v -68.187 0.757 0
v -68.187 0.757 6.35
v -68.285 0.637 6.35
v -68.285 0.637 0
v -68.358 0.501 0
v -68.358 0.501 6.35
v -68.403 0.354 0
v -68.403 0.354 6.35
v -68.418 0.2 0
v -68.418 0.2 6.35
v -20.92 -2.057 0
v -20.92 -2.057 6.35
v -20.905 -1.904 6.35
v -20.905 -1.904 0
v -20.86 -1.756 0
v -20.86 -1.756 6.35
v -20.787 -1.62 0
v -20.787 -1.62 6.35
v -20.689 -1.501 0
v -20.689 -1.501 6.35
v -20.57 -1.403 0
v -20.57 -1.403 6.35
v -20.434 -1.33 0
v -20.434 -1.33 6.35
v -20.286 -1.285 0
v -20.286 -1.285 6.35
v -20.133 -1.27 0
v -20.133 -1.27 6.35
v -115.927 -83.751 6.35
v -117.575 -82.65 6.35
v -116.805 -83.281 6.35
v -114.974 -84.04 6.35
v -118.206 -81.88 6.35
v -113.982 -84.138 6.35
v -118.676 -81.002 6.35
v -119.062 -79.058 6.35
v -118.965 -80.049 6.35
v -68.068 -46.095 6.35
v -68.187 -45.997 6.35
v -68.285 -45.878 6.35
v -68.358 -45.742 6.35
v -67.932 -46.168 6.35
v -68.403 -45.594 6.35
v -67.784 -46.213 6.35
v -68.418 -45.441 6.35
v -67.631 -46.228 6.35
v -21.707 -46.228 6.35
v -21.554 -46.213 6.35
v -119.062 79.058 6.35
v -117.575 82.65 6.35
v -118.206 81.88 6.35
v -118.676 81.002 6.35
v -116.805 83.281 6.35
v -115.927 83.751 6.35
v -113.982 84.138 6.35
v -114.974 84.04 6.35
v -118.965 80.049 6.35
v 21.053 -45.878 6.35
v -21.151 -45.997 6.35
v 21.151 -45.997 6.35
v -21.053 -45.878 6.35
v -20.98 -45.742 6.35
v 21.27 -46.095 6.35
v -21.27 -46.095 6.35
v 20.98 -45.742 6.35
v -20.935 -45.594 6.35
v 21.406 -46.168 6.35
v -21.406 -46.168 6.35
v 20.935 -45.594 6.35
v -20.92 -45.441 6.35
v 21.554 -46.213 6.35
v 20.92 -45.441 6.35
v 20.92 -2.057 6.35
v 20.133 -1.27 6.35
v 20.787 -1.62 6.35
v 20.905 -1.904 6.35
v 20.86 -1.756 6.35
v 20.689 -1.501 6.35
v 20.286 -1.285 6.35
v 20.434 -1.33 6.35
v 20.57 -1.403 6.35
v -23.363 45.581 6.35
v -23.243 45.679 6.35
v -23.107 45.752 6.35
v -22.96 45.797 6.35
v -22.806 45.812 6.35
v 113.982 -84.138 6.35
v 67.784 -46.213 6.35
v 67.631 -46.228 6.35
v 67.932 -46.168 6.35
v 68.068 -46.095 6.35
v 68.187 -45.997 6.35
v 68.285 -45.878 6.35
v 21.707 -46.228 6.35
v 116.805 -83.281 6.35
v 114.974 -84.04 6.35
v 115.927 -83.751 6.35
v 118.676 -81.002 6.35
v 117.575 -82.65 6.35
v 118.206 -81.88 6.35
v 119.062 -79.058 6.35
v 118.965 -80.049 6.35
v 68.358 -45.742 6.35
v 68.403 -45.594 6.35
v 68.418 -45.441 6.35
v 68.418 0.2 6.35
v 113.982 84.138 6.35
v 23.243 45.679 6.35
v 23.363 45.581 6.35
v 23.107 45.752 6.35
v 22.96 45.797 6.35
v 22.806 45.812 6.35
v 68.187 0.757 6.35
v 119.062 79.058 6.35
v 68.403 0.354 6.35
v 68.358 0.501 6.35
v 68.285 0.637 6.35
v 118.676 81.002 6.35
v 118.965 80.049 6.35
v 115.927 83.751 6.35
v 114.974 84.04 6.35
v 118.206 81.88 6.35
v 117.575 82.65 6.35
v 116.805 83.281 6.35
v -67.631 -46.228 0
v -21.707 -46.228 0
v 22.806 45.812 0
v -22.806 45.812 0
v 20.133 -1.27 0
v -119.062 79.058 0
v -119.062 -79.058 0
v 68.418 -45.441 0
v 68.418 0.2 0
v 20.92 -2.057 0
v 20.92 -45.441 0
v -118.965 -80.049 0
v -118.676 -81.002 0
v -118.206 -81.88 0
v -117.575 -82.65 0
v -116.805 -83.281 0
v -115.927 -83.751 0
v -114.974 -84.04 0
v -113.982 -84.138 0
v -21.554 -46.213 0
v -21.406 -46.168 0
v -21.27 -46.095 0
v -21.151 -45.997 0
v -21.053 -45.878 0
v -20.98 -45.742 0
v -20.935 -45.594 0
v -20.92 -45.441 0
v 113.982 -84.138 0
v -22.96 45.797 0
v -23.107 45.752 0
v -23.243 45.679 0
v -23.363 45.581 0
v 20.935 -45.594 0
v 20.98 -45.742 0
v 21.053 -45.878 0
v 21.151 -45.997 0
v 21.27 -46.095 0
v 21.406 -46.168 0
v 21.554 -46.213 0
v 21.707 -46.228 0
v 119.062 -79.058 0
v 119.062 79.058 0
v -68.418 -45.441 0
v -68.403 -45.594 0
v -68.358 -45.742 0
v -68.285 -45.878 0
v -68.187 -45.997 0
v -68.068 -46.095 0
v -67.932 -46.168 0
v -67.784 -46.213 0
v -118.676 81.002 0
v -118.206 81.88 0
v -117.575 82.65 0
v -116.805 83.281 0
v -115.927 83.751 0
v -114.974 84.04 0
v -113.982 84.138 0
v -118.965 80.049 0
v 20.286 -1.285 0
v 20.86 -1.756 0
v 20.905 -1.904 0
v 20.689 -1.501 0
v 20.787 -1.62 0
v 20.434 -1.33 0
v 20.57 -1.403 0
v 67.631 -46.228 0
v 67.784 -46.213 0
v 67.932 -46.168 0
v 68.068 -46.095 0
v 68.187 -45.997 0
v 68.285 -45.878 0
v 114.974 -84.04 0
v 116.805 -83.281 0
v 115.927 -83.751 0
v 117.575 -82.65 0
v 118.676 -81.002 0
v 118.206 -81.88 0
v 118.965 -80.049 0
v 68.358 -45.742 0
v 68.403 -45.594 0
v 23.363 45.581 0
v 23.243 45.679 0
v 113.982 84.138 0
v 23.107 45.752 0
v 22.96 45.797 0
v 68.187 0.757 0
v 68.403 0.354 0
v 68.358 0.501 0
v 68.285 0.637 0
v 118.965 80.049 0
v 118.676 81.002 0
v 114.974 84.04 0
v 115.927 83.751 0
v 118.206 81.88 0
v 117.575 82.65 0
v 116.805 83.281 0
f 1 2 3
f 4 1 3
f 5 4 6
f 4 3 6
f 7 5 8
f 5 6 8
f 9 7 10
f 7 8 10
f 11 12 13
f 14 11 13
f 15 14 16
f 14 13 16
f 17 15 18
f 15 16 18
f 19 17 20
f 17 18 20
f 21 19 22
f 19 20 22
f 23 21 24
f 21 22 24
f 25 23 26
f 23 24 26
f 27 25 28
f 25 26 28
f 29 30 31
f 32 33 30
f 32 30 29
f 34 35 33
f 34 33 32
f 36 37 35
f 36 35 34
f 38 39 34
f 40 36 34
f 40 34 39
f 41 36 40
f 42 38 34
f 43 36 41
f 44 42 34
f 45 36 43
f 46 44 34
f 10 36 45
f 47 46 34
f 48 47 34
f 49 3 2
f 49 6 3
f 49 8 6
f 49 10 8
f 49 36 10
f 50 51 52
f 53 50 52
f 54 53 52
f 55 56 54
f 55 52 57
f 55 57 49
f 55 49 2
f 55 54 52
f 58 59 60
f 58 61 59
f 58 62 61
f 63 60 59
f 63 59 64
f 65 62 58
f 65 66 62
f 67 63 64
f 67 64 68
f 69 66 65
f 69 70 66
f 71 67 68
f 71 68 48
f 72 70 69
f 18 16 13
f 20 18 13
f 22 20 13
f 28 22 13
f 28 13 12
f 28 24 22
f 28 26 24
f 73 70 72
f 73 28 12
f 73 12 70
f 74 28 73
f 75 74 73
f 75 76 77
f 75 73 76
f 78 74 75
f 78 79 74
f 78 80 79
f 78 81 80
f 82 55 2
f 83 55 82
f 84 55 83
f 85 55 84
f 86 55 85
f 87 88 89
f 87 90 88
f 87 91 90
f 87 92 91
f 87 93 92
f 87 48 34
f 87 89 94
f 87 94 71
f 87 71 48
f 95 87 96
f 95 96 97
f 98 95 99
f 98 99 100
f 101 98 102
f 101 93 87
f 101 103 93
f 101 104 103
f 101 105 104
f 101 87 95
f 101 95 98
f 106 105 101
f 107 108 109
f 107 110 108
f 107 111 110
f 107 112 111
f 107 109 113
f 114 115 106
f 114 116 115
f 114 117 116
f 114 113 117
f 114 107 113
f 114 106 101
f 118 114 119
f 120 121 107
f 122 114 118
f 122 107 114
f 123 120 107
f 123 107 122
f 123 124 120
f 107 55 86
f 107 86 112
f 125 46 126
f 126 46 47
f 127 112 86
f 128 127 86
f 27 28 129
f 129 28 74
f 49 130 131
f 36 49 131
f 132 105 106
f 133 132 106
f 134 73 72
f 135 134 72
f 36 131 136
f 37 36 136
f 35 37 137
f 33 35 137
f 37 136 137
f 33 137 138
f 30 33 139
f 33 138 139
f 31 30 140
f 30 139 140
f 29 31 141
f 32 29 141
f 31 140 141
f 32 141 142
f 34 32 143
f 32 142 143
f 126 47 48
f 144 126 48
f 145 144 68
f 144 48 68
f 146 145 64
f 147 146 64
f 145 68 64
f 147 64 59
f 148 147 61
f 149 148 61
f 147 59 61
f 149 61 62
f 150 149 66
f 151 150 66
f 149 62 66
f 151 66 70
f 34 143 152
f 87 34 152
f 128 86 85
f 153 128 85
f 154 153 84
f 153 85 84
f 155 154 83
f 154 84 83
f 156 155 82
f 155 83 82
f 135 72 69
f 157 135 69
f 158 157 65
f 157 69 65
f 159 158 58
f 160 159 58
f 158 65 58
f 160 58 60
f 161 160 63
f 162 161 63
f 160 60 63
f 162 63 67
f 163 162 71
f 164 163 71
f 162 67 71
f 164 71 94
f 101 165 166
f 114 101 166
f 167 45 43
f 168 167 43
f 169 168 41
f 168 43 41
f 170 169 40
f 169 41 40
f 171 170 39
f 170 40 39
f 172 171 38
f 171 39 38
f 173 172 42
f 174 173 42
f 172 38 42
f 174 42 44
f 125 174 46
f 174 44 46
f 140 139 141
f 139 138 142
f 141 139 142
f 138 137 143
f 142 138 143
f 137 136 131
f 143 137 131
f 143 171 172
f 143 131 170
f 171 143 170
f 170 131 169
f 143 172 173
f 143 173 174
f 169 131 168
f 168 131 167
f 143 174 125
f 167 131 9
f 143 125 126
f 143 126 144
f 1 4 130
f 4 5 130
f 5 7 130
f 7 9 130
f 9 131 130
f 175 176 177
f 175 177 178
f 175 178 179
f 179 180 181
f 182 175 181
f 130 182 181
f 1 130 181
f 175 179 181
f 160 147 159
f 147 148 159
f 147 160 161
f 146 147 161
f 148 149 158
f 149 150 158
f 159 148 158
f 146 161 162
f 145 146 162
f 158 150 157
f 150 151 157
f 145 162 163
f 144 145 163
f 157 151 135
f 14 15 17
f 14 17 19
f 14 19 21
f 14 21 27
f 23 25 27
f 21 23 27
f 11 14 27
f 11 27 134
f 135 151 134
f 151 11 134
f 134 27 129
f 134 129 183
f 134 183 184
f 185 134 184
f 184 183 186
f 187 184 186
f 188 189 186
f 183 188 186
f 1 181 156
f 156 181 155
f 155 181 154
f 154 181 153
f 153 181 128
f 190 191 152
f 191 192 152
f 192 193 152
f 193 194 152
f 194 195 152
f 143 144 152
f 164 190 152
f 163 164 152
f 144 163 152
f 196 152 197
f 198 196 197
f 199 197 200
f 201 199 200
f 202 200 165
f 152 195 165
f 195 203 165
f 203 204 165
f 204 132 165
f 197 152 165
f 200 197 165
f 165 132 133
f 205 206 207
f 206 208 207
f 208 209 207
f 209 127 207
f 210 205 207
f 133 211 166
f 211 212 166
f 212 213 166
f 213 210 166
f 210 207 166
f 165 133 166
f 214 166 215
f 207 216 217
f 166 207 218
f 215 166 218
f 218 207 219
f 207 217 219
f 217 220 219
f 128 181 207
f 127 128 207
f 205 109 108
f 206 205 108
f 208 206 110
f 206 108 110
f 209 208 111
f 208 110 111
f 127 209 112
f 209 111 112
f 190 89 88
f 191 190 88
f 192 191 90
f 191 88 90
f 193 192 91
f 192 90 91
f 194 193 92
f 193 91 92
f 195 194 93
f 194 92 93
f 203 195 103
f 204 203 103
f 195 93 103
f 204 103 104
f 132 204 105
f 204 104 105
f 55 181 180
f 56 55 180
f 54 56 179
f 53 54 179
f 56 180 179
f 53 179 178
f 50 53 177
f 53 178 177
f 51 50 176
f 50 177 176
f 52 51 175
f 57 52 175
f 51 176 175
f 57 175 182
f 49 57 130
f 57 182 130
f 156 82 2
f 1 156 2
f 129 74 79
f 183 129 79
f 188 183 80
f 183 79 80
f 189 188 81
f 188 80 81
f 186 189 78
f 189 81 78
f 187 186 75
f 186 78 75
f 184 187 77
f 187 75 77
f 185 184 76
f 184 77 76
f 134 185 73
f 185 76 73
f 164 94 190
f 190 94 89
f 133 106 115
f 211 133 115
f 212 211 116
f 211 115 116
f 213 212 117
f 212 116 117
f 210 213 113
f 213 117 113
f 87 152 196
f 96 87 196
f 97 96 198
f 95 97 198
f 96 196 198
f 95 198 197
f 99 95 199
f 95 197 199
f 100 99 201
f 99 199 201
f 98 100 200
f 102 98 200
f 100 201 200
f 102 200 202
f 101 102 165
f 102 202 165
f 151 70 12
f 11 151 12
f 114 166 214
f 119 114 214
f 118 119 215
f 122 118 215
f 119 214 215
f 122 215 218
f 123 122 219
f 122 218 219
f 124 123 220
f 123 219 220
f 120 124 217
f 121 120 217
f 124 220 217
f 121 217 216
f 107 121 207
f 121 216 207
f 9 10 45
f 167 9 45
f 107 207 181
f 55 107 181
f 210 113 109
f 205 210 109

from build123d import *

# Parameters (mm, degrees)
F1_DEPTH = 6.35
F3_DEPTH = 25.4
F5_DEPTH = 25.4


with BuildPart() as f1:
    # F0 (on Top) → F1 (new body)
    with BuildSketch(Plane.XY):
        with BuildLine():
            Line((113.9825, 84.1375), (-113.9825, 84.1375))
            ThreePointArc((-113.9825, 84.1375), (-117.574602, 82.649602), (-119.0625, 79.0575))
            Line((-119.0625, 79.0575), (-119.0625, -79.0575))
            ThreePointArc((-119.0625, -79.0575), (-117.574602, -82.649602), (-113.9825, -84.1375))
            Line((-113.9825, -84.1375), (113.9825, -84.1375))
            ThreePointArc((113.9825, -84.1375), (117.574602, -82.649602), (119.0625, -79.0575))
            Line((119.0625, -79.0575), (119.0625, 79.0575))
            ThreePointArc((119.0625, 79.0575), (117.574602, 82.649602), (113.9825, 84.1375))
        make_face()
    extrude(amount=F1_DEPTH)

    # F2 (on face) → F3 (cut)
    with BuildSketch(Plane.XY.offset(6.35)):
        Polygon((22.606, 44.54207), (0, 44.54207), (-22.606, 44.54207), (-67.14807, 0), (-67.14807, -44.958), (-22.19007, -44.958), (-22.19007, 0), (0, 0), (22.19007, 0), (22.19007, -44.958), (67.14807, -44.958), (67.14807, 0), align=None)
    extrude(amount=-F3_DEPTH, mode=Mode.SUBTRACT)

    # F4 (on face) → F5 (cut)
    with BuildSketch(Plane.XY.offset(6.35)):
        with BuildLine():
            ThreePointArc((-22.805899, 45.81207), (-23.107224, 45.752133), (-23.362675, 45.581446))
            Line((-23.362675, 45.581446), (-68.187446, 0.756675))
            ThreePointArc((-68.187446, 0.756675), (-68.358133, 0.501224), (-68.41807, 0.199899))
            Line((-68.41807, 0.199899), (-68.41807, -45.4406))
            ThreePointArc((-68.41807, -45.4406), (-68.187446, -45.997376), (-67.63067, -46.228))
            Line((-67.63067, -46.228), (-21.70747, -46.228))
            ThreePointArc((-21.70747, -46.228), (-21.150694, -45.997376), (-20.92007, -45.4406))
            Line((-20.92007, -45.4406), (-20.92007, -2.0574))
            ThreePointArc((-20.92007, -2.0574), (-20.689446, -1.500624), (-20.13267, -1.27))
            Line((-20.13267, -1.27), (20.13267, -1.27))
            ThreePointArc((20.13267, -1.27), (20.689446, -1.500624), (20.92007, -2.0574))
            Line((20.92007, -2.0574), (20.92007, -45.4406))
            ThreePointArc((20.92007, -45.4406), (21.150694, -45.997376), (21.70747, -46.228))
            Line((21.70747, -46.228), (67.63067, -46.228))
            ThreePointArc((67.63067, -46.228), (68.187446, -45.997376), (68.41807, -45.4406))
            Line((68.41807, -45.4406), (68.41807, 0.199899))
            ThreePointArc((68.41807, 0.199899), (68.358133, 0.501224), (68.187446, 0.756675))
            Line((68.187446, 0.756675), (23.362675, 45.581446))
            ThreePointArc((23.362675, 45.581446), (23.107224, 45.752133), (22.805899, 45.81207))
            Line((22.805899, 45.81207), (-22.805899, 45.81207))
        make_face()
    extrude(amount=-F5_DEPTH, mode=Mode.SUBTRACT)


solid = f1.part
